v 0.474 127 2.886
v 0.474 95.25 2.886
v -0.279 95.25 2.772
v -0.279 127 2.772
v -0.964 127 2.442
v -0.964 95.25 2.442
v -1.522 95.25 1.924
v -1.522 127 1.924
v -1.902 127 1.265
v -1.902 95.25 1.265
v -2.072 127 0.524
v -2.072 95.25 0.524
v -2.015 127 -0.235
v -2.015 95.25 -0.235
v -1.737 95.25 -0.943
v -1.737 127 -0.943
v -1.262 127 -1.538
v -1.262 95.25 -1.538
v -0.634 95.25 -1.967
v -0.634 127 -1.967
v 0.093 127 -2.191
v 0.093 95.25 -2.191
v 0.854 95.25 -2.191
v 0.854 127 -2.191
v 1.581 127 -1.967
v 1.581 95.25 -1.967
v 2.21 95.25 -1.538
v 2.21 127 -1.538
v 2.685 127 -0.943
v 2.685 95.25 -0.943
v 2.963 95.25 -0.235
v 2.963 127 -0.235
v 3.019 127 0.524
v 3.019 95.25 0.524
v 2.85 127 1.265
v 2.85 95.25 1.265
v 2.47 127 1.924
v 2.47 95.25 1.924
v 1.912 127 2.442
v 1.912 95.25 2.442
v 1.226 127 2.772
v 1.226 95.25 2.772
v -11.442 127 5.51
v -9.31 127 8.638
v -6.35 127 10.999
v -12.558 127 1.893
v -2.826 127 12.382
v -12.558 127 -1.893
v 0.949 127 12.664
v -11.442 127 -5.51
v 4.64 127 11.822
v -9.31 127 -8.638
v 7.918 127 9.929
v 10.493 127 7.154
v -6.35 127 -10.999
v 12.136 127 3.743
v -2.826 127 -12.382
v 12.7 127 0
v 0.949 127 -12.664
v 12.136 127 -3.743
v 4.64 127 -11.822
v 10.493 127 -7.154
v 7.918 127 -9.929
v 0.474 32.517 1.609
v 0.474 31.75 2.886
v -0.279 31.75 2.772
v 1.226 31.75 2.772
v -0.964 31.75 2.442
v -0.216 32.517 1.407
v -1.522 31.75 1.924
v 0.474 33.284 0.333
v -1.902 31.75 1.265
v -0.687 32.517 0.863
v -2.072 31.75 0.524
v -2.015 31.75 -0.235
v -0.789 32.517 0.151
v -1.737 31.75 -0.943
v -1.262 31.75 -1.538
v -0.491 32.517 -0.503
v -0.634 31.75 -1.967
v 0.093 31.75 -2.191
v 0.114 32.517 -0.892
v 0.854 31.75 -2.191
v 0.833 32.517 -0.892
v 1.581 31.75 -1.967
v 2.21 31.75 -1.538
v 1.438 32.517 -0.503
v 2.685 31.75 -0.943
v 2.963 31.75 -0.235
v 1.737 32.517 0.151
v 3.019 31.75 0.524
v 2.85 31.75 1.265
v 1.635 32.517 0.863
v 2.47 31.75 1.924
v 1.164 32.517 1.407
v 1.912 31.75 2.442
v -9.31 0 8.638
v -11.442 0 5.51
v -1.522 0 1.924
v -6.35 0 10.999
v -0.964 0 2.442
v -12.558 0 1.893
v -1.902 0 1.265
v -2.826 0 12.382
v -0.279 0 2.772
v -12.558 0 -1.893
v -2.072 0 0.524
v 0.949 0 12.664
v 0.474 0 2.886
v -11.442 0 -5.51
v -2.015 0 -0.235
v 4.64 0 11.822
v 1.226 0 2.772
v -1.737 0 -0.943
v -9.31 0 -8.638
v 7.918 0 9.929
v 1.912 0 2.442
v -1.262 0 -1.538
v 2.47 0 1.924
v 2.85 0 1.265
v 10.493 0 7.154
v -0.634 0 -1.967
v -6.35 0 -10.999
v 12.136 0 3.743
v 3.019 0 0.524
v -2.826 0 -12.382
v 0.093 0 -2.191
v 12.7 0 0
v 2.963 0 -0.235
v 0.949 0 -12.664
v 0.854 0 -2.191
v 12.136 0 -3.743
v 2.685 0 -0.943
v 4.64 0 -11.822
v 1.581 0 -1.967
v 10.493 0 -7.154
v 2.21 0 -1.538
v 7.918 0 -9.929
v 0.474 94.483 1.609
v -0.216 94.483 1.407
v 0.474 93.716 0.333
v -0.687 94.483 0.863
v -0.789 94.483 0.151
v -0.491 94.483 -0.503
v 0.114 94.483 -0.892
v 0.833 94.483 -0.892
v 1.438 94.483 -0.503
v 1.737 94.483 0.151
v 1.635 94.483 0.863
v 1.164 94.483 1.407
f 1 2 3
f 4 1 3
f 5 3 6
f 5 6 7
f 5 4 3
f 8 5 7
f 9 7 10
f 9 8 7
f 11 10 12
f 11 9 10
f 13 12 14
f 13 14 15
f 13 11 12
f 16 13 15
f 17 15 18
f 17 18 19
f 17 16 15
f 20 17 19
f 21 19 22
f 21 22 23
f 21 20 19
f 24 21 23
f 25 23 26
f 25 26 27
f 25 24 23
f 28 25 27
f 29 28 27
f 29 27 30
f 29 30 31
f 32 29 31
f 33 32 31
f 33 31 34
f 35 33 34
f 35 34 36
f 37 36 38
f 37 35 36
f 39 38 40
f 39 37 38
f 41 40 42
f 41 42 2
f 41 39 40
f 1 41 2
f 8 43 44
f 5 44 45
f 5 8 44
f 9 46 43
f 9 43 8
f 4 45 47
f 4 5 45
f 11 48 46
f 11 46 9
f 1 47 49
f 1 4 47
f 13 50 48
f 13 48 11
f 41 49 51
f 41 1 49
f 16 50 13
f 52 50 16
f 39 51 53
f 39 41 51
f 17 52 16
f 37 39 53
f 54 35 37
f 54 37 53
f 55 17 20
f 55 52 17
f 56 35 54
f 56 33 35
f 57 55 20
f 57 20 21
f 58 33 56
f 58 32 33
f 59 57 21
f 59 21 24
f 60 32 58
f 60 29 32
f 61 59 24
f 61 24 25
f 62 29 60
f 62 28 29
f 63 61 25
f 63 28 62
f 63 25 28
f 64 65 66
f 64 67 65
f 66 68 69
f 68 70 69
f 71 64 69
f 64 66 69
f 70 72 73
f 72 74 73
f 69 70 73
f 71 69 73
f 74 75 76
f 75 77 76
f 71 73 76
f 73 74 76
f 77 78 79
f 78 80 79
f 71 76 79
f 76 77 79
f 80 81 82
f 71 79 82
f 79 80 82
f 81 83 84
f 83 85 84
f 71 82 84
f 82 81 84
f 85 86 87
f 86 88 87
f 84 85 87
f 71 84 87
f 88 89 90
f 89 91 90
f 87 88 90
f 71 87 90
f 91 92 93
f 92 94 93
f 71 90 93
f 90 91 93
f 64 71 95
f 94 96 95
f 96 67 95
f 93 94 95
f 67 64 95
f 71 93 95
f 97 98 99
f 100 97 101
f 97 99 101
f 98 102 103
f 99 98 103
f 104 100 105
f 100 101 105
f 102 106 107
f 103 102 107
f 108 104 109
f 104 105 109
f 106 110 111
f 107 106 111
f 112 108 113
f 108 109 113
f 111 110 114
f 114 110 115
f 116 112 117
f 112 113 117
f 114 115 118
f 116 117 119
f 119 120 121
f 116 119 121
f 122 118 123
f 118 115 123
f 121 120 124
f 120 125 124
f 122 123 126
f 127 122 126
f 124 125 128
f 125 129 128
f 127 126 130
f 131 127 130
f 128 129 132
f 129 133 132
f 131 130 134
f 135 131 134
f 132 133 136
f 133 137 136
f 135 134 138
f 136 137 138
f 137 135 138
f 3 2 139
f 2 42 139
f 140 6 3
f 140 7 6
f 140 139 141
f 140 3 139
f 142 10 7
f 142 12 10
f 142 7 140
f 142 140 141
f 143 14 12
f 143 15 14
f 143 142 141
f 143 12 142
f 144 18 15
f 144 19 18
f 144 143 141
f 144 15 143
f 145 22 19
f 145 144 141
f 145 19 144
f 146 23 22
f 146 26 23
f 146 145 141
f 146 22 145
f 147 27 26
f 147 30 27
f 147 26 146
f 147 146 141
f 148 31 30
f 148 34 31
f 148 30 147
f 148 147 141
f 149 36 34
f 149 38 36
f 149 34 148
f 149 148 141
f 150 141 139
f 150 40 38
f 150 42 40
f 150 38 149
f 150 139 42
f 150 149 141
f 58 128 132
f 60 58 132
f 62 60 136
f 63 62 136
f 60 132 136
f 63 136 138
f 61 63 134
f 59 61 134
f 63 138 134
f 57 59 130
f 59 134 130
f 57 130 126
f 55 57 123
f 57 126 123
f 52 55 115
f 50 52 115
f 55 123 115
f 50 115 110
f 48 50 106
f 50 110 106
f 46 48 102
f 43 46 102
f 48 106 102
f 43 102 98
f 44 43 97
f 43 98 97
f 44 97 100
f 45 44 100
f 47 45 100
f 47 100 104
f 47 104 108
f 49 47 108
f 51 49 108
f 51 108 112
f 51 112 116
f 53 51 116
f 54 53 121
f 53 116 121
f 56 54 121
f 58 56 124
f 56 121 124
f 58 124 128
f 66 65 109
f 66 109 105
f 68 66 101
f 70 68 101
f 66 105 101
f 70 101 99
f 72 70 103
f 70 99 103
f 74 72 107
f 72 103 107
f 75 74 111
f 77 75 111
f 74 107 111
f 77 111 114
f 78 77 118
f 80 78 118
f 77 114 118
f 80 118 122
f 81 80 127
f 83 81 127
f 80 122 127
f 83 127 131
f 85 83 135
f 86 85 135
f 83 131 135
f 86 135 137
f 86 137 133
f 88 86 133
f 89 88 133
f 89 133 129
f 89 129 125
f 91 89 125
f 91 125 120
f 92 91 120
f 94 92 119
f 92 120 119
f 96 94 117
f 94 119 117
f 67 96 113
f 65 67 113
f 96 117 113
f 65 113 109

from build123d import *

# Parameters (mm, degrees)
SKETCH2_R           = 12.7
BOSS_EXTRUDE1_DEPTH = 127


with BuildPart() as part:
    # Sketch2 → Boss-Extrude1 (new body)
    with BuildSketch(Plane(origin=(0, 0, 0), x_dir=(1, 0, 0), z_dir=(0, 1, 0))):
        Circle(SKETCH2_R)
    extrude(amount=BOSS_EXTRUDE1_DEPTH)

    # Sketch4 → 1/4-20 Tapped Hole1 (revolve, cut)
    with BuildSketch(Plane(origin=(0.473892963, 127, 0.332854466), x_dir=(0, 0, 1), z_dir=(1, 0, 0))):
        Polygon((0, 0), (0, 33.283816902), (2.5527, 31.75), (2.5527, 0), align=None)
    f_1_4_20_tapped_hole1 = revolve(axis=Axis((0.473892963, 133.35, 0.332854466), (0, -1, 0)), mode=Mode.SUBTRACT)

    # Mirror1: 1/4-20 Tapped Hole1 across plane
    add(f_1_4_20_tapped_hole1.mirror(Plane.ZX.offset(63.5)), mode=Mode.SUBTRACT)


solid = part.part
